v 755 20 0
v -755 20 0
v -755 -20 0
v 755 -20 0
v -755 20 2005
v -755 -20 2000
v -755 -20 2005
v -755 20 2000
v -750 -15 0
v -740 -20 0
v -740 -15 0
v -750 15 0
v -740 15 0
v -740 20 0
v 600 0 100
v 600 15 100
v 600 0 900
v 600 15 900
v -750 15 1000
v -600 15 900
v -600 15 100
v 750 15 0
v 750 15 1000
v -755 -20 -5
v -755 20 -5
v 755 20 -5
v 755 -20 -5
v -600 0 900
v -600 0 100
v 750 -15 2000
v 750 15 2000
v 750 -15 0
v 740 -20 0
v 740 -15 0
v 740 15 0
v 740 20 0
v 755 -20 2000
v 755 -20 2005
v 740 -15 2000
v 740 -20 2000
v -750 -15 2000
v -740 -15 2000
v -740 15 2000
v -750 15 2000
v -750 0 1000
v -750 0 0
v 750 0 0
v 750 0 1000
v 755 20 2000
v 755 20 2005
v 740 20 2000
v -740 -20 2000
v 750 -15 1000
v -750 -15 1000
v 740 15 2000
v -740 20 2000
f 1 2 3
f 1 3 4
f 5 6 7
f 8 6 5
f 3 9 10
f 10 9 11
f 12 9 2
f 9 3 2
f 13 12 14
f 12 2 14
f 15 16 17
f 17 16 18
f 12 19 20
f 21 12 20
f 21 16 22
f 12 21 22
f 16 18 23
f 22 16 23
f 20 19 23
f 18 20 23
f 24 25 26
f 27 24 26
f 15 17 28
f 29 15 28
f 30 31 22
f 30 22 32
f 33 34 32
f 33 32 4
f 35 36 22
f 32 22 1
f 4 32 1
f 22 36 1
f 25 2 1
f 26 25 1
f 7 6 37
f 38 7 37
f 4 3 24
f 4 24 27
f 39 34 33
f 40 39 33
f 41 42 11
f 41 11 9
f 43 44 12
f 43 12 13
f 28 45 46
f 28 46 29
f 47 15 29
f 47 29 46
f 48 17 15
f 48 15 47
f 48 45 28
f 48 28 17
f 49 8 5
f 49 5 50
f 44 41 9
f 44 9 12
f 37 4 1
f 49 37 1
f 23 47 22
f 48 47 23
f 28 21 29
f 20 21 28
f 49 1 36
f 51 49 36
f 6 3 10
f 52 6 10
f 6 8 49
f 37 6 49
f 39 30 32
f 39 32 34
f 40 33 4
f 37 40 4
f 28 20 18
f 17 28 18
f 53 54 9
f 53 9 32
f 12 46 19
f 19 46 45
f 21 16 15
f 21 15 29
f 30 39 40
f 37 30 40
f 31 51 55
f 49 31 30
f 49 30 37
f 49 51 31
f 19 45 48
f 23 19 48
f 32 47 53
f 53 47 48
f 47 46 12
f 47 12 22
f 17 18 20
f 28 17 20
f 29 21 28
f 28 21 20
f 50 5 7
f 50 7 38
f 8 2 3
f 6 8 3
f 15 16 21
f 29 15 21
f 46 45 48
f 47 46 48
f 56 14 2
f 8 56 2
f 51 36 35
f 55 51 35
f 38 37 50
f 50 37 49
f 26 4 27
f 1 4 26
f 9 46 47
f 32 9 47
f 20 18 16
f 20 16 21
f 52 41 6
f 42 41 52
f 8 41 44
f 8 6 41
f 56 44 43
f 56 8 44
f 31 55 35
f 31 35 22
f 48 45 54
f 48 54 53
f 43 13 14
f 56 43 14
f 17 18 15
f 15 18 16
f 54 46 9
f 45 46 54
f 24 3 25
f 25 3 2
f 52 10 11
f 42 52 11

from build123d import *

# Parameters (mm, degrees)
F1_DEPTH  = 2000
F2_W      = 1500
F2_H      = 1000
F3_DEPTH  = 15
F4_DEPTH  = 15
F5_W      = 1510
F5_H      = 40
F6_DEPTH  = 5
F7_W      = 1510
F7_H      = 40
F8_DEPTH  = 5
F10_DEPTH = 15
F11_W     = 1200
F11_H     = 800
F12_DEPTH = 15


with BuildPart() as f1:
    # F0 (on Top) → F1 (new body)
    with BuildSketch(Plane.XY):
        Polygon((-750, -15), (-750, 0), (-750, 15), (-740, 15), (-740, 20), (-755, 20), (-755, 0), (-755, -20), (-740, -20), (-740, -15), align=None)
        Polygon((750, -15), (740, -15), (740, -20), (755, -20), (755, 0), (755, 20), (740, 20), (740, 15), (750, 15), (750, 0), align=None)
    extrude(amount=F1_DEPTH)


with BuildPart() as f3:
    # F2 (on Front) → F3 (new body)
    with BuildSketch(Plane.XZ):
        with Locations((0, 500)):
            Rectangle(F2_W, F2_H)
    extrude(amount=F3_DEPTH)


with BuildPart() as f4:
    # F2 (on Front) → F4 (new body)
    with BuildSketch(Plane.XZ):
        with Locations((0, 500)):
            Rectangle(F2_W, F2_H)
    extrude(amount=-F4_DEPTH)

    # F9 (on face) → F10 (cut)
    with BuildSketch(Plane(origin=(0, 15, 0), x_dir=(-1, 0, 0), z_dir=(0, 1, 0))):
        Polygon((-600, 100), (0, 100), (600, 100), (600, 900), (0, 900), (-600, 900), align=None)
    extrude(amount=-F10_DEPTH, mode=Mode.SUBTRACT)


with BuildPart() as f6:
    # F5 (on face) → F6 (new body)
    with BuildSketch(Plane.XY.offset(2000)):
        Rectangle(F5_W, F5_H)
    extrude(amount=F6_DEPTH)


with BuildPart() as f8:
    # F7 (on face) → F8 (new body)
    with BuildSketch(Plane.XY):
        Rectangle(F7_W, F7_H)
    extrude(amount=-F8_DEPTH)


with BuildPart() as f12:
    # F11 (on face) → F12 (new body)
    with BuildSketch(Plane(origin=(0, 15, 0), x_dir=(-1, 0, 0), z_dir=(0, 1, 0))):
        with Locations((0, 500)):
            Rectangle(F11_W, F11_H)
    extrude(amount=-F12_DEPTH)


solid = Compound([f1.part, f3.part, f4.part, f6.part, f8.part, f12.part])
